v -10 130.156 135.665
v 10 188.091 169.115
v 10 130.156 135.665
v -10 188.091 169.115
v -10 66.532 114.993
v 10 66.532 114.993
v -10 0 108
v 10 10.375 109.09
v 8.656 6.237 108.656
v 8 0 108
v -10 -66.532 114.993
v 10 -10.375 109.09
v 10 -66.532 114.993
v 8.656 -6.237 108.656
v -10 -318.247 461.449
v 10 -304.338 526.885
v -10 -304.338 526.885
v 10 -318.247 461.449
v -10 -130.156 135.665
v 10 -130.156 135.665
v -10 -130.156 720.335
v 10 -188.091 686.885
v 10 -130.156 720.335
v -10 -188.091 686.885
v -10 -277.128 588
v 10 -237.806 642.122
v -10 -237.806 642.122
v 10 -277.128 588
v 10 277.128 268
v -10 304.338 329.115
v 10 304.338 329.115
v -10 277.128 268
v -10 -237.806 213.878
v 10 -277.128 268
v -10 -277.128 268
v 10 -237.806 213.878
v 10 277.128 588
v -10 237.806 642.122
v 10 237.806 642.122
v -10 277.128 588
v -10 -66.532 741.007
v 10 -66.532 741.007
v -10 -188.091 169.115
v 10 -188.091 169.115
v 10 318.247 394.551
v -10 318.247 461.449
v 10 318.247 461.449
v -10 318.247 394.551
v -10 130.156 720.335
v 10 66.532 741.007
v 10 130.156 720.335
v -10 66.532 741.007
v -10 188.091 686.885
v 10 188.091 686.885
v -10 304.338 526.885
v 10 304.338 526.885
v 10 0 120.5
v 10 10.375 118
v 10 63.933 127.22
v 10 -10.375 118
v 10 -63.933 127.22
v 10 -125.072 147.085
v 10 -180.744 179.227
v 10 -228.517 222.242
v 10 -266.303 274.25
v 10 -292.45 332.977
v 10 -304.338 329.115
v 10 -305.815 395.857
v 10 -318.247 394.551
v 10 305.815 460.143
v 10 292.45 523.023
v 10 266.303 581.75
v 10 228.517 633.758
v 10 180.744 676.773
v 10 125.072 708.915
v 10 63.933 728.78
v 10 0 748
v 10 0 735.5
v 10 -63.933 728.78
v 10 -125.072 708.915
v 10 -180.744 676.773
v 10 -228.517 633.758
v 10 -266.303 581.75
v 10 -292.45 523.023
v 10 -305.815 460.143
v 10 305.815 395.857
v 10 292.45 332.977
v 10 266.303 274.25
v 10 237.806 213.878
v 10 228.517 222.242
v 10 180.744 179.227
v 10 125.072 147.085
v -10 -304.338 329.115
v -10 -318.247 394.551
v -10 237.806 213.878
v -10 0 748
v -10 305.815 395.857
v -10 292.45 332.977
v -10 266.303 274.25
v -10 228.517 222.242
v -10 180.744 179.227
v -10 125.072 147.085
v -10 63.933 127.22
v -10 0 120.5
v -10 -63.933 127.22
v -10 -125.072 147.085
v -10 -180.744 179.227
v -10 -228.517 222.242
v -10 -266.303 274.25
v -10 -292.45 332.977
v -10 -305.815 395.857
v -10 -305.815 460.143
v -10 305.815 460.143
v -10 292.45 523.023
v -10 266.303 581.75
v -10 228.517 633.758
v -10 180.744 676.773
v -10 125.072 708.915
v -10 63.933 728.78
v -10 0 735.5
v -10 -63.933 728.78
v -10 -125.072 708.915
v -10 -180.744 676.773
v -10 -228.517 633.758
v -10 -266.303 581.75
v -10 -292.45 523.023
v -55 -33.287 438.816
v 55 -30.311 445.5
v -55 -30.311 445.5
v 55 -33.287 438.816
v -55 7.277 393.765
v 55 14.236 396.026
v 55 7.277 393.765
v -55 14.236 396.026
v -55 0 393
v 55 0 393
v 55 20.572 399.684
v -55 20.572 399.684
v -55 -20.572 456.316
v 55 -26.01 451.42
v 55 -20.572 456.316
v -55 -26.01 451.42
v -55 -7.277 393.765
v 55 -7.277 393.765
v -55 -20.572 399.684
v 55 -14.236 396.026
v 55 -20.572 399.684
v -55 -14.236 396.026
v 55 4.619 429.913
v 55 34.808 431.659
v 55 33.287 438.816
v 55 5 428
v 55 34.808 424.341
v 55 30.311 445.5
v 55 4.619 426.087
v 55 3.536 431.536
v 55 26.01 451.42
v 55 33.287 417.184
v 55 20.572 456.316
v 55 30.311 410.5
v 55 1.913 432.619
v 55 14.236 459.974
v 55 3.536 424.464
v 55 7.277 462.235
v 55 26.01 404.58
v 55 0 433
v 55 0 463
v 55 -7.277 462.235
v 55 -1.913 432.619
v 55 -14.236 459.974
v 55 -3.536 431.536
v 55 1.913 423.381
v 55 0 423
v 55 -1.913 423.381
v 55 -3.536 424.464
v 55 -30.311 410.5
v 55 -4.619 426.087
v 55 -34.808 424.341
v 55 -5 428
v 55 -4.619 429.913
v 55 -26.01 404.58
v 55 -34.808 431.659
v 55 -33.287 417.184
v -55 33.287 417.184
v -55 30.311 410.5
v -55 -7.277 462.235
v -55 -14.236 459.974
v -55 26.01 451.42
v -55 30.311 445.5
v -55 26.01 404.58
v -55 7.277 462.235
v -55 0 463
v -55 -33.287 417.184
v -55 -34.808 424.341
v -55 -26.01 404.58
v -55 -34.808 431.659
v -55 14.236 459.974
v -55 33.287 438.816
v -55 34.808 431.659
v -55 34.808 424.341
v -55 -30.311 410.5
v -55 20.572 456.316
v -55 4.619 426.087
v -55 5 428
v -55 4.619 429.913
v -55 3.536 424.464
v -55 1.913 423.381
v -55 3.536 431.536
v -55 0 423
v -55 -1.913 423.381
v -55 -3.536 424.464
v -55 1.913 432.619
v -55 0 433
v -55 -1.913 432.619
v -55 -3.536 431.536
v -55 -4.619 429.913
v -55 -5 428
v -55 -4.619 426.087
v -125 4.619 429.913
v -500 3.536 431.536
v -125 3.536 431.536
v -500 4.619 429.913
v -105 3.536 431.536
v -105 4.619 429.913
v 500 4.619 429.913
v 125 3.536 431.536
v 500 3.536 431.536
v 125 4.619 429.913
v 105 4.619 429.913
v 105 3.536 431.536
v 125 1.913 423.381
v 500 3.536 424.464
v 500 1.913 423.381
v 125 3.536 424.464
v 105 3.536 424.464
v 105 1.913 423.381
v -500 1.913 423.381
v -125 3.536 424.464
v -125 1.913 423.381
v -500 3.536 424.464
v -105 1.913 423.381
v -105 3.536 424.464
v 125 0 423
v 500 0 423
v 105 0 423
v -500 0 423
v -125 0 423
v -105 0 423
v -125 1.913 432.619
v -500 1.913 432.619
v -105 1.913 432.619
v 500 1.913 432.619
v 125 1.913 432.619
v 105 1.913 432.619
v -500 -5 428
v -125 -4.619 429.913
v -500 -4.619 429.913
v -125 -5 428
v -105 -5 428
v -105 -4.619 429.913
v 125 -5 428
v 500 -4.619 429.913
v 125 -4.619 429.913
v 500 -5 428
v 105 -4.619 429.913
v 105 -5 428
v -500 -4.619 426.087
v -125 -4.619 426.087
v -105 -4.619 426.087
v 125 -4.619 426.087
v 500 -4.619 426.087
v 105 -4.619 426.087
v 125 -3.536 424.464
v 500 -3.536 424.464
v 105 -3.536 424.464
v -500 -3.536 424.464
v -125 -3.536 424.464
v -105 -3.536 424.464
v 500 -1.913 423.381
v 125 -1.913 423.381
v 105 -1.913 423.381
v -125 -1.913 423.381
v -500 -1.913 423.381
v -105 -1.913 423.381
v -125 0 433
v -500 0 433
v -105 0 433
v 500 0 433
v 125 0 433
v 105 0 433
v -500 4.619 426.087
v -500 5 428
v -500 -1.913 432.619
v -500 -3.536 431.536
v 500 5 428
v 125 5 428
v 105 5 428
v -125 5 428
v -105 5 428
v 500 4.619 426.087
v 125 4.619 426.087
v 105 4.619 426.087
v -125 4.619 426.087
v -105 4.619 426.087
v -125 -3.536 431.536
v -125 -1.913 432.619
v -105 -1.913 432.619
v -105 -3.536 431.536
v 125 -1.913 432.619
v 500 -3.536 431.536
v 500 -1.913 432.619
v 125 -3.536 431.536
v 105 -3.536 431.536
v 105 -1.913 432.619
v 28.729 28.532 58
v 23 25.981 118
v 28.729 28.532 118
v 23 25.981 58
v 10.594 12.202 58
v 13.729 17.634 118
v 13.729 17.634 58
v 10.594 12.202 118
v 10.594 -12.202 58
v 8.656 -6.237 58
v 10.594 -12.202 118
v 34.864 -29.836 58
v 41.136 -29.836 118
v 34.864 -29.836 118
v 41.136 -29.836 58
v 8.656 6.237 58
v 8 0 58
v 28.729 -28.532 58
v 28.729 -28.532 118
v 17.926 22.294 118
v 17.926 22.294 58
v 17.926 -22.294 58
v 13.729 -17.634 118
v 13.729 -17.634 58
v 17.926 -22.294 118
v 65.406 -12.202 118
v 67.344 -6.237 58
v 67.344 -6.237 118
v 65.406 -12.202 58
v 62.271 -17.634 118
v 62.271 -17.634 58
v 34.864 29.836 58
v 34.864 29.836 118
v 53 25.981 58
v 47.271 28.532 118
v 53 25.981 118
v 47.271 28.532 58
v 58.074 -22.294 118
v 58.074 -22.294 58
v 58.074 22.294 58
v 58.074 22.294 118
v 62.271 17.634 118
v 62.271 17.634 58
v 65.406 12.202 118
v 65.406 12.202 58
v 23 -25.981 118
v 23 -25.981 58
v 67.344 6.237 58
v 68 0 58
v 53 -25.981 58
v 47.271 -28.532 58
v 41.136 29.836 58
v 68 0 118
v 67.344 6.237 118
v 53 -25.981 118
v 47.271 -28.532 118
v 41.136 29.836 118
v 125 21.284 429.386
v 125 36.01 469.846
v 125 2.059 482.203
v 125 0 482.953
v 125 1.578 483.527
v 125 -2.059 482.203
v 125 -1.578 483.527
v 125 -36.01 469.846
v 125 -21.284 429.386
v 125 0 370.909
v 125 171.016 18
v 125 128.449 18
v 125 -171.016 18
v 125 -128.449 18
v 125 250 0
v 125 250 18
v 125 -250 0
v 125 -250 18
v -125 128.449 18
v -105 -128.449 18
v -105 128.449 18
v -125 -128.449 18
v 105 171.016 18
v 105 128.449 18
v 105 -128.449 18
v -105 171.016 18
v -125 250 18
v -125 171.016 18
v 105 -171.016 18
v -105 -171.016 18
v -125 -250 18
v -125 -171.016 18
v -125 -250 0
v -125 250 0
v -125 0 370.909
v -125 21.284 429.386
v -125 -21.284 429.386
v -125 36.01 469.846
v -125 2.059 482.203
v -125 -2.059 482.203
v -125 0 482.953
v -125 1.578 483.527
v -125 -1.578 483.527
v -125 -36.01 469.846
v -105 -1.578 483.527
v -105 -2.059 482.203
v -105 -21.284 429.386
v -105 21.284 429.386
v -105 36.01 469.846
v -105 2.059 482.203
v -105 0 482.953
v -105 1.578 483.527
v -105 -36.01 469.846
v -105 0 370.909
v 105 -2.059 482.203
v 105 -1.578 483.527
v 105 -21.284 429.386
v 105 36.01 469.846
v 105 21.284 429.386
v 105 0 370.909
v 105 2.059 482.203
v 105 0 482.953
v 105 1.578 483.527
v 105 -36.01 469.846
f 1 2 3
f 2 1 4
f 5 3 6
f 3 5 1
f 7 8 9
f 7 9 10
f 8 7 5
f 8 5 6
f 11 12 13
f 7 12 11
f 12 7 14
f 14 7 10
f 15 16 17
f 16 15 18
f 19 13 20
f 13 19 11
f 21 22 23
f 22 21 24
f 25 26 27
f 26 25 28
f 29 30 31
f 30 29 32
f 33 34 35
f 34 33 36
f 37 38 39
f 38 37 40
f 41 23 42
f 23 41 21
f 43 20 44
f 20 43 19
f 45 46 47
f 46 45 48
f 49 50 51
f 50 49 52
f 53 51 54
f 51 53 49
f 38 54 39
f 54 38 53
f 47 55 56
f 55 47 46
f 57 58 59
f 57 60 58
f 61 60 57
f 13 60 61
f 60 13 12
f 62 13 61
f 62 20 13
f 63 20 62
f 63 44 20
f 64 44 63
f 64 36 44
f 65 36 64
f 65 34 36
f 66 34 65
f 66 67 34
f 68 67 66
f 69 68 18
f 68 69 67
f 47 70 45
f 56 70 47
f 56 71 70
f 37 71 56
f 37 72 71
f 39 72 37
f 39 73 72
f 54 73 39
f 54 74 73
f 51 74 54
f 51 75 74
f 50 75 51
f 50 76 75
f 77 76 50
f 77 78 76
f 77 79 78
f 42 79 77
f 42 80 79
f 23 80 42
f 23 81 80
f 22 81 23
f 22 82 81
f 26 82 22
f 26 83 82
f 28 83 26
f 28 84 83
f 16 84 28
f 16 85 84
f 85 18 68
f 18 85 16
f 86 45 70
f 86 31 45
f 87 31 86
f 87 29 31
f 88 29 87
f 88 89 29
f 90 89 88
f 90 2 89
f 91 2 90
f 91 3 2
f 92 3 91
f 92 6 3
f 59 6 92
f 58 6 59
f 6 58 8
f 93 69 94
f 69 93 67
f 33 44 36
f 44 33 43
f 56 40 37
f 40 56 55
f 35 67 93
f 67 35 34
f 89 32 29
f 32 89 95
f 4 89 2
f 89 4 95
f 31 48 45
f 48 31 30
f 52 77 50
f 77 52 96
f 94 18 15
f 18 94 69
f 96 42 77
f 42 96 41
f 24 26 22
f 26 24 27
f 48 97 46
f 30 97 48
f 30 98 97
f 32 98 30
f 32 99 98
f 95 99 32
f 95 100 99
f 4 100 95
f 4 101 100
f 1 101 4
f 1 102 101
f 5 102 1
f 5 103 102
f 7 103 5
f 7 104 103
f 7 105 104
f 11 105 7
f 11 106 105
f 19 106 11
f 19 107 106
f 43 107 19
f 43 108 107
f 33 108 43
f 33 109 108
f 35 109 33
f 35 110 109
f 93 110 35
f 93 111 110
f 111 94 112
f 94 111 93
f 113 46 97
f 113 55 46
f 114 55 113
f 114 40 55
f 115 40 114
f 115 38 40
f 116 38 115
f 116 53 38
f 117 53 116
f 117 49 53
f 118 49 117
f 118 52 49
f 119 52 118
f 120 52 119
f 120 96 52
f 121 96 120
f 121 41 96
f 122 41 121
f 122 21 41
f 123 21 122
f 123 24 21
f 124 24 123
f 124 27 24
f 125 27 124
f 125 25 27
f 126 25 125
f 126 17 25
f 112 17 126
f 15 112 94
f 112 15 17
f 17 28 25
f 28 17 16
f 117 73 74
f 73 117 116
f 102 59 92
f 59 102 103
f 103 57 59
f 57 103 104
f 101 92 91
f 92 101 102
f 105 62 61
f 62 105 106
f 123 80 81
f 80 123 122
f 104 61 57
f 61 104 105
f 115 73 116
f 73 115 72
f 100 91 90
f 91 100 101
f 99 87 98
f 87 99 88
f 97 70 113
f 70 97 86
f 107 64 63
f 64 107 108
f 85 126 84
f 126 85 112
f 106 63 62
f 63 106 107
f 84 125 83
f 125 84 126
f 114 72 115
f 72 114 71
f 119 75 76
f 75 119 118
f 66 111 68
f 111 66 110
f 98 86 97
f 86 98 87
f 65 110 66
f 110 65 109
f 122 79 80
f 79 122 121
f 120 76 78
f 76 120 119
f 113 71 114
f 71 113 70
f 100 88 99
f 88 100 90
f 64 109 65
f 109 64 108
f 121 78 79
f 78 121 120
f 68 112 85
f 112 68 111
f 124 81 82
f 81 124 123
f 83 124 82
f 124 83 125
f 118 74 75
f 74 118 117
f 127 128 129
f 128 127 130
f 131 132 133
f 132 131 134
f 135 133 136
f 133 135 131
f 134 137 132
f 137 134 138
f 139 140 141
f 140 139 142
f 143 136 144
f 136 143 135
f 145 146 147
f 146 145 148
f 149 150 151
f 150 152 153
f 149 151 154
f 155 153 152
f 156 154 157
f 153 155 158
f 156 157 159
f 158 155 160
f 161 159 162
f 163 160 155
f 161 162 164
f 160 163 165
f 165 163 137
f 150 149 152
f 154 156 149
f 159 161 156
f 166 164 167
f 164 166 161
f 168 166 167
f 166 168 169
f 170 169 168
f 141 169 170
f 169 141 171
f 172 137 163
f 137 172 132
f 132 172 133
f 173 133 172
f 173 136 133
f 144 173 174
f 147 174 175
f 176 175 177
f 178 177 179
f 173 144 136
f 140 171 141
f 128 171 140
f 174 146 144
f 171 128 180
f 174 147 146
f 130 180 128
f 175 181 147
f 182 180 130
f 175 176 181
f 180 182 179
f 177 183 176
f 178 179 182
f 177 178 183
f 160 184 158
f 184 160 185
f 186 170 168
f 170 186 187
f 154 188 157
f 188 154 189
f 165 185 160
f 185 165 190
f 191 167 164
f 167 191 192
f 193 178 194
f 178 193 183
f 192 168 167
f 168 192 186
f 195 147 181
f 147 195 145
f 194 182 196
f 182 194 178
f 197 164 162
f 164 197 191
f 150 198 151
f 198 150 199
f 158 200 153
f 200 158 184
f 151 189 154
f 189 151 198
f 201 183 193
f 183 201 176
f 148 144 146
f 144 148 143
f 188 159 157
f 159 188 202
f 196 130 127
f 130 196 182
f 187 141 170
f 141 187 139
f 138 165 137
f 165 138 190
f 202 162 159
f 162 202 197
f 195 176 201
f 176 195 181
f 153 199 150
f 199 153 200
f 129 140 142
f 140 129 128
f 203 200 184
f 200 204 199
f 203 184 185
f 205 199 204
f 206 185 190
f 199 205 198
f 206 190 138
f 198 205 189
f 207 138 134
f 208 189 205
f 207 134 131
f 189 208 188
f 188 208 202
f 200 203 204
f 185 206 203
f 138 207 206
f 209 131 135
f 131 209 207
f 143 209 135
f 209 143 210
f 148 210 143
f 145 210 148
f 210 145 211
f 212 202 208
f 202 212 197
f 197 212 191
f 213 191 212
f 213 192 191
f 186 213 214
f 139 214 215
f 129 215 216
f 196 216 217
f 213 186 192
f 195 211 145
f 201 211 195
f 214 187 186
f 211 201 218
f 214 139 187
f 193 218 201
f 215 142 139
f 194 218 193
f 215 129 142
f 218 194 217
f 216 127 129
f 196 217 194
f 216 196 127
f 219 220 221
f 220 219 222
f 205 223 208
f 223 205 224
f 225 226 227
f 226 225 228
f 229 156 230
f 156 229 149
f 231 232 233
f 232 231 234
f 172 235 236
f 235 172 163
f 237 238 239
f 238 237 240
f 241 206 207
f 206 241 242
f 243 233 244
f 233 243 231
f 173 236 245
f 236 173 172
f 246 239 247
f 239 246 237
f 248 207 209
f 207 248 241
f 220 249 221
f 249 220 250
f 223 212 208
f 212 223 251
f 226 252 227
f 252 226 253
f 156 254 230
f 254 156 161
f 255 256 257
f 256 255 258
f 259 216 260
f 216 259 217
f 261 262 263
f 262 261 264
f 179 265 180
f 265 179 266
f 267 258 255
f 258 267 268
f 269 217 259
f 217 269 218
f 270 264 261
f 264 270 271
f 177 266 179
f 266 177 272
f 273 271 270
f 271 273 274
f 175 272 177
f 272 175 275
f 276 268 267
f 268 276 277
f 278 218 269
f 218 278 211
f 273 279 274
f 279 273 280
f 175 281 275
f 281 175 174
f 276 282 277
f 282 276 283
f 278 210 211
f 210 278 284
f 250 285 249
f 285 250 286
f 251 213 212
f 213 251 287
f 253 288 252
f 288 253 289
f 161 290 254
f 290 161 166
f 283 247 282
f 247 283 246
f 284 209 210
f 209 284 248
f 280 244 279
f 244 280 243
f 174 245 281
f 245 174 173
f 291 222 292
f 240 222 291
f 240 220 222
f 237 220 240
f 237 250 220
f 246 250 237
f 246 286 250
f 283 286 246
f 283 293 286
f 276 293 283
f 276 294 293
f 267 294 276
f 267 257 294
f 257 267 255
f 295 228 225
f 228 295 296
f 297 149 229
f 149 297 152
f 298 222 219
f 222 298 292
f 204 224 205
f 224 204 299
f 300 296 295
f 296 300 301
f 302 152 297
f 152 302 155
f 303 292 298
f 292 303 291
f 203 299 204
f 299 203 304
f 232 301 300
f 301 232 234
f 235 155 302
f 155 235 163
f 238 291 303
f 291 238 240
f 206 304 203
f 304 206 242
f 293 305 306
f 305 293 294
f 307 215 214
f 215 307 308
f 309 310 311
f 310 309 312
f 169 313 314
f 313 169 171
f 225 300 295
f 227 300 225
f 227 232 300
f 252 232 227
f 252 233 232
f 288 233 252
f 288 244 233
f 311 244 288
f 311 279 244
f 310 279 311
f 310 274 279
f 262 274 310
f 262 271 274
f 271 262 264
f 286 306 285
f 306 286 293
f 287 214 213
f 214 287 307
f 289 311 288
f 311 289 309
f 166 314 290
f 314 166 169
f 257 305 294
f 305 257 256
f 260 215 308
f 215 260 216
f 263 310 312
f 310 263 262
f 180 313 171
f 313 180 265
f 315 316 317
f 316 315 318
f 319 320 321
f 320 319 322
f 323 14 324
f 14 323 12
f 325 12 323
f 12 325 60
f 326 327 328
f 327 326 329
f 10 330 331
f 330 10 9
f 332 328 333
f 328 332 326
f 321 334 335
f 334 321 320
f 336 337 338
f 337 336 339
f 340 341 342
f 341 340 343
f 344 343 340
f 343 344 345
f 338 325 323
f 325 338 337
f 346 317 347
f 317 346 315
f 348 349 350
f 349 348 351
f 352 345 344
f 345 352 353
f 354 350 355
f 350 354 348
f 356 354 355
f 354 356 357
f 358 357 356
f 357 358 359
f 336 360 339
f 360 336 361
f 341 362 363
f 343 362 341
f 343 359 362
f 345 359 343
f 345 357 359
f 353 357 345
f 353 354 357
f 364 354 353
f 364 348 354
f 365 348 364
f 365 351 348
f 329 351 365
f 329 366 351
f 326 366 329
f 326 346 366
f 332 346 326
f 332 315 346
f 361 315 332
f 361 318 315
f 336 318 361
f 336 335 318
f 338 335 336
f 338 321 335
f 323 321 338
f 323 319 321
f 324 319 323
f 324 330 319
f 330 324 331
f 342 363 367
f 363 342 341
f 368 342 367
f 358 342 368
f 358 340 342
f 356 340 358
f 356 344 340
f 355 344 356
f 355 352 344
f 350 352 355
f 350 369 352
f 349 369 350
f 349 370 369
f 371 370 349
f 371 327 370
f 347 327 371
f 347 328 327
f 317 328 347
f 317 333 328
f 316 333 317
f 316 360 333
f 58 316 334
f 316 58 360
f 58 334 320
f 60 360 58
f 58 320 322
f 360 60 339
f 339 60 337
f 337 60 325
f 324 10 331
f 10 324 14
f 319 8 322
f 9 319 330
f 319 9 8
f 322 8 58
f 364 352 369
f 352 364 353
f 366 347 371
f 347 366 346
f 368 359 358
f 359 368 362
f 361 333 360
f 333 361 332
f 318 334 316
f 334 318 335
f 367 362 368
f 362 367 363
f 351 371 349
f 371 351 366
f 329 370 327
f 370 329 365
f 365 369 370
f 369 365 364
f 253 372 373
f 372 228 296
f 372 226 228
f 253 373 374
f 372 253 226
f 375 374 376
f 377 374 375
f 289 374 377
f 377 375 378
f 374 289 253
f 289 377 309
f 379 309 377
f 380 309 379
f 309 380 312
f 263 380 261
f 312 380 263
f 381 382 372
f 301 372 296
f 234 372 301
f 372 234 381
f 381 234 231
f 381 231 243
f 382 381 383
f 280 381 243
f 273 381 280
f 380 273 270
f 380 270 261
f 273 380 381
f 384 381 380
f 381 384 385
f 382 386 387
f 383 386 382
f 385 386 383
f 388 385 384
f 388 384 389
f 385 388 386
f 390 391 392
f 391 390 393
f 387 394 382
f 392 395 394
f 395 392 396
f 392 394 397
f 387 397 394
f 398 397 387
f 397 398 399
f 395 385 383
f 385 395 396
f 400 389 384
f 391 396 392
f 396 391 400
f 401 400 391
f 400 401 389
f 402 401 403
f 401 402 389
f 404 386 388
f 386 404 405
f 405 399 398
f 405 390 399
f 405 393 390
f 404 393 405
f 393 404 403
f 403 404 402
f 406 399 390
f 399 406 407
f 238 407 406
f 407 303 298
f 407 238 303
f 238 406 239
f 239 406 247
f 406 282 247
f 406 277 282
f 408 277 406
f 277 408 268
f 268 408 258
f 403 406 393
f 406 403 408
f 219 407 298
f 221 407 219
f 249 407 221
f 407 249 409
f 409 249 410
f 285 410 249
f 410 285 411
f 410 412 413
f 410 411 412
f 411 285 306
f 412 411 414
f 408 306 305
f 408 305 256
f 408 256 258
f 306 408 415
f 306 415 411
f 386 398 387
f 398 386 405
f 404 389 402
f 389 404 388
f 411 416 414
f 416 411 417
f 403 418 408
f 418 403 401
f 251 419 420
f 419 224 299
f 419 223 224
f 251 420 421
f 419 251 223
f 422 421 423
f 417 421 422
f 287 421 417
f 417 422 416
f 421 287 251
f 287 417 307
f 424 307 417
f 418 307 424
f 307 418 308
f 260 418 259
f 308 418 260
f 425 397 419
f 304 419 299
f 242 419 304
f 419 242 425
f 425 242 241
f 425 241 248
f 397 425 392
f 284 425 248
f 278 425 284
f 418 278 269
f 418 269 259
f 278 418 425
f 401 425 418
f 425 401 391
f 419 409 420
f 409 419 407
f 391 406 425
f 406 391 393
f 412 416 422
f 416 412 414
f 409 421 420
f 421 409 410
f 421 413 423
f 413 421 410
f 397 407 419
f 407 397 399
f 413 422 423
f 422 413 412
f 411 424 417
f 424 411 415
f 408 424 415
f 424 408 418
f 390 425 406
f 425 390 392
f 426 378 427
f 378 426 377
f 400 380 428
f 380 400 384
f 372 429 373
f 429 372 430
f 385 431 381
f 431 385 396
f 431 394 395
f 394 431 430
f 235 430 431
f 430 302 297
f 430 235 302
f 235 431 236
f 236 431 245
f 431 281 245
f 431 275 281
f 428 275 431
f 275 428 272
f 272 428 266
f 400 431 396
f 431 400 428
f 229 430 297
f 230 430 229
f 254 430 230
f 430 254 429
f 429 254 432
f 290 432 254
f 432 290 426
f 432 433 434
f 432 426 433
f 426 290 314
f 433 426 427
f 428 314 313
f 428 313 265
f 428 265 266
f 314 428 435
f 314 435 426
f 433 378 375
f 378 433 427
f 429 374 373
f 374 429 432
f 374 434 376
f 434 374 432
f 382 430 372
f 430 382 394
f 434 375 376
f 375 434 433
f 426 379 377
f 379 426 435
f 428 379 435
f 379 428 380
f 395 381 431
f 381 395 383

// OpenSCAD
base_width=250;
base_length=500;
base_thickness=18;

wheel_outer_diameter=640;
wheel_outer_thickness=20;
wheel_outer_height1=25;
wheel_outer_height2=23;
wheel_inner_diameter1=70;
wheel_inner_diameter2=50;
wheel_inner_thickness1=110;
wheel_inner_thickness2=85;

cup_diameter=60;
cup_height=60;

module wheel(wheel_outer_height, wheel_inner_thickness, wheel_inner_diameter) {
  translate([0, 0, -wheel_outer_thickness/2]) difference() {
    cylinder(h=wheel_outer_thickness, d=wheel_outer_diameter);
    translate([0, 0, -1]) cylinder(h=wheel_outer_thickness+2, d=wheel_outer_diameter-wheel_outer_height);
  }
    translate([0, 0, -wheel_inner_thickness/2]) cylinder(h=wheel_inner_thickness, d=wheel_inner_diameter);
    color("red") translate([0, 0, -500]) cylinder(h=1000, d=10);
translate([wheel_outer_diameter/2-10, 0, base_thickness+20]) rotate([0, 90, 0]) cylinder(h=cup_height, d=cup_diameter);
}

translate([0, 0, wheel_outer_diameter/2 + base_thickness+cup_height+30]) rotate([0, 90, 0]) {
  wheel(wheel_outer_height1, wheel_inner_thickness1, wheel_inner_diameter1);
  //wheel(wheel_outer_height2, wheel_inner_thickness2, wheel_inner_diameter2);
}

bar_thickness=20;
bar_angle=70;
bar_length=500;
bar_margin=115;

module barsnbase(wheel_inner_thickness) {
  translate([-base_width/2, -base_length/2, 0]) {
    cube([base_width, base_length, base_thickness]);


    translate([bar_thickness, bar_margin, 0]) rotate([0, -bar_angle, 90]) cube([bar_length, bar_thickness, 40]);
    translate([0, base_length-bar_margin, 0]) rotate([0, -bar_angle, -90]) cube([bar_length, bar_thickness, 40]);

    translate([base_width, bar_margin, 0]) rotate([0, -bar_angle, 90]) cube([bar_length, bar_thickness, 40]);
    translate([base_width-20, base_length-bar_margin, 0]) rotate([0, -bar_angle, -90]) cube([bar_length, bar_thickness, 40]);
  }
}

barsnbase(wheel_inner_thickness1);
//barsnbase(wheel_inner_thickness2);
